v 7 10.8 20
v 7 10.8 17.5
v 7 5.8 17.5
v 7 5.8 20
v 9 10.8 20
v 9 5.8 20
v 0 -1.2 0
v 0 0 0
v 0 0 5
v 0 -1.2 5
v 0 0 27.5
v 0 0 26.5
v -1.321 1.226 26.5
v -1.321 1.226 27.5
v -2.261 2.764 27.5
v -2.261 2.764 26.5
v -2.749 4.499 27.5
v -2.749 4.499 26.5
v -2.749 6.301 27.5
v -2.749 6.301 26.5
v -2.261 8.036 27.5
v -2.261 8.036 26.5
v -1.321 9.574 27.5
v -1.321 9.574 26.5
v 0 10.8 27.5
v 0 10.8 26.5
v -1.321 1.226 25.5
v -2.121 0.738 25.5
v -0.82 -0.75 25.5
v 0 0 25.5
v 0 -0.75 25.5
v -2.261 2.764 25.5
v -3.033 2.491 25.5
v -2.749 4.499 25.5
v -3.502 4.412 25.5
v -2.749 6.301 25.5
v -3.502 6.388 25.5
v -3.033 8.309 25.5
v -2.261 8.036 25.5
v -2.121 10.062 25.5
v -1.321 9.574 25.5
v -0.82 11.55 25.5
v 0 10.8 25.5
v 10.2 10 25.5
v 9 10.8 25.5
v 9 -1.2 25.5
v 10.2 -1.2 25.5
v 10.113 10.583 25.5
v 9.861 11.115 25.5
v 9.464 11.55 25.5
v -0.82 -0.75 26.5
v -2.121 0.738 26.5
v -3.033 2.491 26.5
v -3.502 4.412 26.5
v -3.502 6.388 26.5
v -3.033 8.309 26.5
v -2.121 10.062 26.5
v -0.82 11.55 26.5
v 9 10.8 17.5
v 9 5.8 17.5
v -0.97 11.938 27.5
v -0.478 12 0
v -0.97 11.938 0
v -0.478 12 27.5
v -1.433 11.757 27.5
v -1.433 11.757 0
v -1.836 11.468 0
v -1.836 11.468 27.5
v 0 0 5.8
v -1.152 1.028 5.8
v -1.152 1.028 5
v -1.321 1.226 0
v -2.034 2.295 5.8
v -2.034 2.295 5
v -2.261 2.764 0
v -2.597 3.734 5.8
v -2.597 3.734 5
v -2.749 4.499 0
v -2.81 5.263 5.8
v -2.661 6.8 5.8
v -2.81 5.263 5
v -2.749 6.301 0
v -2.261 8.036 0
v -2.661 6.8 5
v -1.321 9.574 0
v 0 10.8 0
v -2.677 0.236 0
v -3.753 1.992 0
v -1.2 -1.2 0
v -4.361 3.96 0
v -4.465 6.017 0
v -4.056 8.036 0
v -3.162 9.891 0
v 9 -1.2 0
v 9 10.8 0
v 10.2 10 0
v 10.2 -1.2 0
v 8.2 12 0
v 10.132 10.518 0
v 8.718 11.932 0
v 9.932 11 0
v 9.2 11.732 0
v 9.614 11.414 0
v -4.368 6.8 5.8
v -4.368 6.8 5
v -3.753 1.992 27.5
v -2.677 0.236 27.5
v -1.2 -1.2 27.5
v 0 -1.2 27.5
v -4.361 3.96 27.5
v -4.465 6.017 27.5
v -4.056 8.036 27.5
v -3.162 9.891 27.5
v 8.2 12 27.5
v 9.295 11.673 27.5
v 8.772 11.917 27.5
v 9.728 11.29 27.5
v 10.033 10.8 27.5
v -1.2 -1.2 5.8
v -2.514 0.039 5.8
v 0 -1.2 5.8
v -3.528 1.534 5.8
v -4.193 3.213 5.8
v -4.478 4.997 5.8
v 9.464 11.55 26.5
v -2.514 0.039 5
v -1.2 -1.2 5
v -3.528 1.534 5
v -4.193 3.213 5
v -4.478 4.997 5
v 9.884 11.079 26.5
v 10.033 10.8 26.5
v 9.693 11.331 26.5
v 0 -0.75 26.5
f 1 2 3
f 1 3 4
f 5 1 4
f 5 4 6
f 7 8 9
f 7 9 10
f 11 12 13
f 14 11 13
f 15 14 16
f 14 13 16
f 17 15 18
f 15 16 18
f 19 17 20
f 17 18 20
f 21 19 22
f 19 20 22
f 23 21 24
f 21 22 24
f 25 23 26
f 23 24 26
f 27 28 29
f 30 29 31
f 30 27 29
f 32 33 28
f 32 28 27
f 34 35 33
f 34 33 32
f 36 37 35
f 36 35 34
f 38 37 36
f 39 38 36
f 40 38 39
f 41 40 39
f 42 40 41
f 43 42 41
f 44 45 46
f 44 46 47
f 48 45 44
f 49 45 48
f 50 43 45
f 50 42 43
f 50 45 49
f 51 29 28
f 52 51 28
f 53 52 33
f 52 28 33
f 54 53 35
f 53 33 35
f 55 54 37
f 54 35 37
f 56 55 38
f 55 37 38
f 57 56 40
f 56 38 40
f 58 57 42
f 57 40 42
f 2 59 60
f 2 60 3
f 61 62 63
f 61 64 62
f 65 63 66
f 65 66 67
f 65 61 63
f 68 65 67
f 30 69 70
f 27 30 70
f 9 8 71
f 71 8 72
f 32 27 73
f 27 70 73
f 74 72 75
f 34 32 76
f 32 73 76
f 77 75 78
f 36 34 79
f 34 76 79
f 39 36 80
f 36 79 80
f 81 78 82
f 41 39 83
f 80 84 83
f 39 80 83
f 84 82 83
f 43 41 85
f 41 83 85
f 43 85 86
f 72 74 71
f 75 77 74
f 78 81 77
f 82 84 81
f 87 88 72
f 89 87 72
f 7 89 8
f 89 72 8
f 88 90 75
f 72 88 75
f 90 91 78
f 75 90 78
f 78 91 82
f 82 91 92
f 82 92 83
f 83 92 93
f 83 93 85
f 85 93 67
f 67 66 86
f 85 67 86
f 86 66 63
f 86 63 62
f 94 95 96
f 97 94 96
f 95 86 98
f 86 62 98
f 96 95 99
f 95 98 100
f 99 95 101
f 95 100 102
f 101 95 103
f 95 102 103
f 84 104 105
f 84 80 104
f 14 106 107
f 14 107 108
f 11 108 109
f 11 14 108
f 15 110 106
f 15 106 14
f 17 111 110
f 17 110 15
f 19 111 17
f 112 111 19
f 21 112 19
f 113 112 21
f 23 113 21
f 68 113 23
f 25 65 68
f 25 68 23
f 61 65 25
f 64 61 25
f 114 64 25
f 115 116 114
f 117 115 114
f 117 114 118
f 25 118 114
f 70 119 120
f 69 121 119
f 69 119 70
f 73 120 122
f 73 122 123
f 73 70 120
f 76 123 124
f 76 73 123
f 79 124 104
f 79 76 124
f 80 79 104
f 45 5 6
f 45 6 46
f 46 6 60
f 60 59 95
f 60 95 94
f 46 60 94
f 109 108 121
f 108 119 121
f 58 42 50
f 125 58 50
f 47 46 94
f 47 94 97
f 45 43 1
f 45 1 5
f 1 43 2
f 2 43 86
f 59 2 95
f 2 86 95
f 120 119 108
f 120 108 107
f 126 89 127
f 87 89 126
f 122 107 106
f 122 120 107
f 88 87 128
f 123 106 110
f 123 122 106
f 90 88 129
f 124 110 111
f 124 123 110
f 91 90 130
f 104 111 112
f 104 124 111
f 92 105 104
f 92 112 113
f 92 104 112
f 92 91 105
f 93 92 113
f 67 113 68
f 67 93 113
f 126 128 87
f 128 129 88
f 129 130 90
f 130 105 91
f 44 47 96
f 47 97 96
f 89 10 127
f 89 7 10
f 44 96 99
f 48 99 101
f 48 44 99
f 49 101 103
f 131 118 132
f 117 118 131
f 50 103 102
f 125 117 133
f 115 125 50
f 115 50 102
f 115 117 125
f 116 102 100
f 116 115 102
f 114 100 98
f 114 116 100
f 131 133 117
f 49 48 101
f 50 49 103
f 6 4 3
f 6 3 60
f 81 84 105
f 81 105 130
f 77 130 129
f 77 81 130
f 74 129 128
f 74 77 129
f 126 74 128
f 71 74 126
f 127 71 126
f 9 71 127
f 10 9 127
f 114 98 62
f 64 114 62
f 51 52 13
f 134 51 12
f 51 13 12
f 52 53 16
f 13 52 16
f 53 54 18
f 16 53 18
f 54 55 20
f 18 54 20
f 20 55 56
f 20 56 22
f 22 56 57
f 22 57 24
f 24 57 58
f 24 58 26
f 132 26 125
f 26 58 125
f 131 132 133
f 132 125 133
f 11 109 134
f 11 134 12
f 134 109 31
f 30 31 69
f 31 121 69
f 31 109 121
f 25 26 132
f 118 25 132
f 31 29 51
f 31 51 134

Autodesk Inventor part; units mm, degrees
ref_plane "YZ Plane" through (0, 0, 0) normal (1, 0, 0) x (0, 1, 0)
ref_plane "XZ Plane" through (0, 0, 0) normal (0, 1, 0) x (-1, 0, 0)
ref_plane "XY Plane" through (0, 0, 0) normal (0, 0, 1) x (1, 0, 0)
sketch "스케치1" plane through (0, 0, 0) normal (0, 0, 1) x (1, 0, 0)
  line L0 (0, 0) -> (9, 0)
  line L1 (9, 0) -> (9, 10.8)
  line L2 (9, 10.8) -> (0, 10.8)
  line L3 (0, 10.8) -> (0, 0)
  line L4 (-1.2, 12) -> (10.2, 12)
  line L5 (10.2, 12) -> (10.2, -1.2)
  line L6 (10.2, -1.2) -> (-1.2, -1.2)
  line L7 (-1.2, -1.2) -> (-1.2, 12)
  line L8 (0, 0) -> (0, -1.2)
  line L9 (9, 0) -> (9, -1.2)
  line L10 (0, 0) -> (-1.2, 0)
  line L11 (9, 0) -> (10.2, 0)
  arc A0 (-1.2, 12) -> (-1.2, -1.2) centre (3.7811, 5.4) ccw
  arc A1 (0, 10.8) -> (0, 0) centre (3.7811, 5.4) ccw
  line L12 (-1.2, 10.4) -> (0, 10.4) construction
  line L13 (0, 10.4) -> (0, 0.4) construction
  line L14 (0, 0.4) -> (-1.2, 0.4) construction
  line L15 (-1.2, 0.4) -> (-1.2, 10.4) construction
  point P0 (0, 5.4)
  dimension "d0" = 9
  dimension "d1" = 10.8
  dimension "d2" = 1.2
  dimension "d35" = 10
  dimension "d36" = 110
extrude "돌출1" add sketch "스케치1" along normal blind 20 contours L8 L6 L7 L10 | L10 L7 A1 | L11 L5 L6 L9 | L1 L2 A1 L7 L4 L5 L11 | L7 A0 A1
sketch "스케치5" plane through (0, 10.8, 0) normal (0, -1, 0) x (1, 0, 0)
  line L0 (0, 0) -> (9, 0) projected
  line L1 (9, 0) -> (9, 20) projected
  line L2 (0, 20) -> (9, 20) projected
  line L3 (0, 0) -> (0, 20) projected
  line L4 (9, 17.5) -> (7, 17.5)
  line L5 (7, 17.5) -> (7, 20)
  line L6 (10.2, 20) -> (-1.2, 20) projected
  point P0 (0, 0)
  point P1 (8.2, 20)
  point P2 (-0.4776, 20)
  dimension "d21" = 2.5
  dimension "d22" = 2
extrude "돌출5" add sketch "스케치5" along normal blind 5 contours L4 L5 L2 L1
sketch "스케치8" plane through (0, -1.2, 0) normal (1, 0, 0) x (0, 0, -1)
  line L0 (0, 0) -> (-20, 0) projected
  line L1 (0, 0) -> (0, 1.2) projected
  line L2 (0, 0) -> (-20, 0) projected
  line L3 (-5, 0) -> (-5.8, 0)
  line L4 (-5.8, 0) -> (-5.8, 8)
  line L5 (-5.8, 8) -> (-5, 8)
  line L6 (-5, 8) -> (-5, 0)
  point P0 (-18.5, 0)
  point P1 (-5.8, 0)
  point P2 (-5, 0)
  dimension "d37" = 5
  dimension "d38" = 0.8
  dimension "d39" = 8
extrude "돌출7" cut sketch "스케치8" against normal through all
sketch "스케치13" plane through (0, 0, 20) normal (0, 0, 1) x (1, 0, 0)
  line L0 (0, 10.8) -> (7, 10.8) projected
  line L1 (9, 5.8) -> (9, -1.2) projected
  line L2 (9, -1.2) -> (10.2, -1.2) projected
  line L3 (10.2, -1.2) -> (10.2, 12) projected
  line L4 (10.2, 12) -> (-1.2, 12) projected
  arc A0 (-1.2, 12) -> (-1.2, -1.2) centre (3.7811, 5.4) ccw projected
  line L5 (-1.2, -1.2) -> (0, -1.2) projected
  line L6 (0, -1.2) -> (0, 0) projected
  arc A1 (0, 10.8) -> (0, 0) centre (3.7811, 5.4) ccw projected
  line L7 (0, 10.8) -> (9, 10.8) projected
  line L8 (7, 10.8) -> (9, 10.8)
  line L9 (9, 10.8) -> (9, 5.8)
extrude "돌출11" add sketch "스케치13" along normal blind 5.5
sketch "스케치14" plane through (0, 0, 25.5) normal (0, 0, 1) x (1, 0, 0)
  line L0 (10.2, -1.2) -> (10.2, 12) projected
  line L1 (10.2, 12) -> (-1.2, 12) projected
  arc A0 (-1.2, 12) -> (-1.2, -1.2) centre (3.7811, 5.4) ccw projected
  line L2 (-1.2, -1.2) -> (0, -1.2) projected
  line L3 (0, -1.2) -> (0, 0) projected
  arc A1 (0, 10.8) -> (0, 0) centre (3.7811, 5.4) ccw projected
  line L4 (0, 10.8) -> (9, 10.8) projected
  arc A2 (-0.8195, 11.55) -> (-0.8195, -0.75) centre (4.7076, 5.4) ccw
  line L5 (-0.8195, 11.55) -> (10.2, 11.55)
  line L6 (10.2, -1.2) -> (10.2, 12) projected
  line L7 (-0.8195, -0.75) -> (0, -0.75)
  dimension "d53" = 0.75
  dimension "d55" = 0.75
  dimension "d56" = 0.75
extrude "돌출12" add sketch "스케치14" along normal blind 1
sketch "스케치15" plane through (0, 0, 26.5) normal (0, 0, 1) x (1, 0, 0)
  line L0 (10.2, 11.55) -> (10.2, 12) projected
  line L1 (10.2, 12) -> (-1.2, 12) projected
  arc A0 (-1.2, 12) -> (-1.2, -1.2) centre (3.7811, 5.4) ccw projected
  line L2 (-1.2, -1.2) -> (0, -1.2) projected
  line L3 (0, -1.2) -> (0, -0.75) projected
  line L4 (10.2, 11.55) -> (-0.8195, 11.55) projected
  arc A1 (-0.8195, 11.55) -> (-0.8195, -0.75) centre (4.7076, 5.4) ccw projected
  line L5 (-0.8195, -0.75) -> (0, -0.75) projected
  line L6 (0, -0.75) -> (0, 0) projected
  arc A2 (0, 10.8) -> (0, 0) centre (3.7811, 5.4) ccw projected
  line L7 (0, 10.8) -> (9, 10.8) projected
  line L8 (9, 10.8) -> (9, -1.2) projected
  line L9 (9, -1.2) -> (10.2, -1.2) projected
  line L10 (10.2, -1.2) -> (10.2, 11.55) projected
  line L11 (9, 10.8) -> (10.2, 10.8)
extrude "돌출13" add sketch "스케치15" along normal blind 1 contours L4 A1 L5 L3 L2 A0 L1 L0 | L10 L11 L7 A2 L6 L5 A1 L4
fillet "모깎기2" radius 2 2 edges at (10.2, 12, 13.75) (-1.2, 12, 13.75)
equation "\"d56\" = d55"
properties part number "_3D 인쇄"
